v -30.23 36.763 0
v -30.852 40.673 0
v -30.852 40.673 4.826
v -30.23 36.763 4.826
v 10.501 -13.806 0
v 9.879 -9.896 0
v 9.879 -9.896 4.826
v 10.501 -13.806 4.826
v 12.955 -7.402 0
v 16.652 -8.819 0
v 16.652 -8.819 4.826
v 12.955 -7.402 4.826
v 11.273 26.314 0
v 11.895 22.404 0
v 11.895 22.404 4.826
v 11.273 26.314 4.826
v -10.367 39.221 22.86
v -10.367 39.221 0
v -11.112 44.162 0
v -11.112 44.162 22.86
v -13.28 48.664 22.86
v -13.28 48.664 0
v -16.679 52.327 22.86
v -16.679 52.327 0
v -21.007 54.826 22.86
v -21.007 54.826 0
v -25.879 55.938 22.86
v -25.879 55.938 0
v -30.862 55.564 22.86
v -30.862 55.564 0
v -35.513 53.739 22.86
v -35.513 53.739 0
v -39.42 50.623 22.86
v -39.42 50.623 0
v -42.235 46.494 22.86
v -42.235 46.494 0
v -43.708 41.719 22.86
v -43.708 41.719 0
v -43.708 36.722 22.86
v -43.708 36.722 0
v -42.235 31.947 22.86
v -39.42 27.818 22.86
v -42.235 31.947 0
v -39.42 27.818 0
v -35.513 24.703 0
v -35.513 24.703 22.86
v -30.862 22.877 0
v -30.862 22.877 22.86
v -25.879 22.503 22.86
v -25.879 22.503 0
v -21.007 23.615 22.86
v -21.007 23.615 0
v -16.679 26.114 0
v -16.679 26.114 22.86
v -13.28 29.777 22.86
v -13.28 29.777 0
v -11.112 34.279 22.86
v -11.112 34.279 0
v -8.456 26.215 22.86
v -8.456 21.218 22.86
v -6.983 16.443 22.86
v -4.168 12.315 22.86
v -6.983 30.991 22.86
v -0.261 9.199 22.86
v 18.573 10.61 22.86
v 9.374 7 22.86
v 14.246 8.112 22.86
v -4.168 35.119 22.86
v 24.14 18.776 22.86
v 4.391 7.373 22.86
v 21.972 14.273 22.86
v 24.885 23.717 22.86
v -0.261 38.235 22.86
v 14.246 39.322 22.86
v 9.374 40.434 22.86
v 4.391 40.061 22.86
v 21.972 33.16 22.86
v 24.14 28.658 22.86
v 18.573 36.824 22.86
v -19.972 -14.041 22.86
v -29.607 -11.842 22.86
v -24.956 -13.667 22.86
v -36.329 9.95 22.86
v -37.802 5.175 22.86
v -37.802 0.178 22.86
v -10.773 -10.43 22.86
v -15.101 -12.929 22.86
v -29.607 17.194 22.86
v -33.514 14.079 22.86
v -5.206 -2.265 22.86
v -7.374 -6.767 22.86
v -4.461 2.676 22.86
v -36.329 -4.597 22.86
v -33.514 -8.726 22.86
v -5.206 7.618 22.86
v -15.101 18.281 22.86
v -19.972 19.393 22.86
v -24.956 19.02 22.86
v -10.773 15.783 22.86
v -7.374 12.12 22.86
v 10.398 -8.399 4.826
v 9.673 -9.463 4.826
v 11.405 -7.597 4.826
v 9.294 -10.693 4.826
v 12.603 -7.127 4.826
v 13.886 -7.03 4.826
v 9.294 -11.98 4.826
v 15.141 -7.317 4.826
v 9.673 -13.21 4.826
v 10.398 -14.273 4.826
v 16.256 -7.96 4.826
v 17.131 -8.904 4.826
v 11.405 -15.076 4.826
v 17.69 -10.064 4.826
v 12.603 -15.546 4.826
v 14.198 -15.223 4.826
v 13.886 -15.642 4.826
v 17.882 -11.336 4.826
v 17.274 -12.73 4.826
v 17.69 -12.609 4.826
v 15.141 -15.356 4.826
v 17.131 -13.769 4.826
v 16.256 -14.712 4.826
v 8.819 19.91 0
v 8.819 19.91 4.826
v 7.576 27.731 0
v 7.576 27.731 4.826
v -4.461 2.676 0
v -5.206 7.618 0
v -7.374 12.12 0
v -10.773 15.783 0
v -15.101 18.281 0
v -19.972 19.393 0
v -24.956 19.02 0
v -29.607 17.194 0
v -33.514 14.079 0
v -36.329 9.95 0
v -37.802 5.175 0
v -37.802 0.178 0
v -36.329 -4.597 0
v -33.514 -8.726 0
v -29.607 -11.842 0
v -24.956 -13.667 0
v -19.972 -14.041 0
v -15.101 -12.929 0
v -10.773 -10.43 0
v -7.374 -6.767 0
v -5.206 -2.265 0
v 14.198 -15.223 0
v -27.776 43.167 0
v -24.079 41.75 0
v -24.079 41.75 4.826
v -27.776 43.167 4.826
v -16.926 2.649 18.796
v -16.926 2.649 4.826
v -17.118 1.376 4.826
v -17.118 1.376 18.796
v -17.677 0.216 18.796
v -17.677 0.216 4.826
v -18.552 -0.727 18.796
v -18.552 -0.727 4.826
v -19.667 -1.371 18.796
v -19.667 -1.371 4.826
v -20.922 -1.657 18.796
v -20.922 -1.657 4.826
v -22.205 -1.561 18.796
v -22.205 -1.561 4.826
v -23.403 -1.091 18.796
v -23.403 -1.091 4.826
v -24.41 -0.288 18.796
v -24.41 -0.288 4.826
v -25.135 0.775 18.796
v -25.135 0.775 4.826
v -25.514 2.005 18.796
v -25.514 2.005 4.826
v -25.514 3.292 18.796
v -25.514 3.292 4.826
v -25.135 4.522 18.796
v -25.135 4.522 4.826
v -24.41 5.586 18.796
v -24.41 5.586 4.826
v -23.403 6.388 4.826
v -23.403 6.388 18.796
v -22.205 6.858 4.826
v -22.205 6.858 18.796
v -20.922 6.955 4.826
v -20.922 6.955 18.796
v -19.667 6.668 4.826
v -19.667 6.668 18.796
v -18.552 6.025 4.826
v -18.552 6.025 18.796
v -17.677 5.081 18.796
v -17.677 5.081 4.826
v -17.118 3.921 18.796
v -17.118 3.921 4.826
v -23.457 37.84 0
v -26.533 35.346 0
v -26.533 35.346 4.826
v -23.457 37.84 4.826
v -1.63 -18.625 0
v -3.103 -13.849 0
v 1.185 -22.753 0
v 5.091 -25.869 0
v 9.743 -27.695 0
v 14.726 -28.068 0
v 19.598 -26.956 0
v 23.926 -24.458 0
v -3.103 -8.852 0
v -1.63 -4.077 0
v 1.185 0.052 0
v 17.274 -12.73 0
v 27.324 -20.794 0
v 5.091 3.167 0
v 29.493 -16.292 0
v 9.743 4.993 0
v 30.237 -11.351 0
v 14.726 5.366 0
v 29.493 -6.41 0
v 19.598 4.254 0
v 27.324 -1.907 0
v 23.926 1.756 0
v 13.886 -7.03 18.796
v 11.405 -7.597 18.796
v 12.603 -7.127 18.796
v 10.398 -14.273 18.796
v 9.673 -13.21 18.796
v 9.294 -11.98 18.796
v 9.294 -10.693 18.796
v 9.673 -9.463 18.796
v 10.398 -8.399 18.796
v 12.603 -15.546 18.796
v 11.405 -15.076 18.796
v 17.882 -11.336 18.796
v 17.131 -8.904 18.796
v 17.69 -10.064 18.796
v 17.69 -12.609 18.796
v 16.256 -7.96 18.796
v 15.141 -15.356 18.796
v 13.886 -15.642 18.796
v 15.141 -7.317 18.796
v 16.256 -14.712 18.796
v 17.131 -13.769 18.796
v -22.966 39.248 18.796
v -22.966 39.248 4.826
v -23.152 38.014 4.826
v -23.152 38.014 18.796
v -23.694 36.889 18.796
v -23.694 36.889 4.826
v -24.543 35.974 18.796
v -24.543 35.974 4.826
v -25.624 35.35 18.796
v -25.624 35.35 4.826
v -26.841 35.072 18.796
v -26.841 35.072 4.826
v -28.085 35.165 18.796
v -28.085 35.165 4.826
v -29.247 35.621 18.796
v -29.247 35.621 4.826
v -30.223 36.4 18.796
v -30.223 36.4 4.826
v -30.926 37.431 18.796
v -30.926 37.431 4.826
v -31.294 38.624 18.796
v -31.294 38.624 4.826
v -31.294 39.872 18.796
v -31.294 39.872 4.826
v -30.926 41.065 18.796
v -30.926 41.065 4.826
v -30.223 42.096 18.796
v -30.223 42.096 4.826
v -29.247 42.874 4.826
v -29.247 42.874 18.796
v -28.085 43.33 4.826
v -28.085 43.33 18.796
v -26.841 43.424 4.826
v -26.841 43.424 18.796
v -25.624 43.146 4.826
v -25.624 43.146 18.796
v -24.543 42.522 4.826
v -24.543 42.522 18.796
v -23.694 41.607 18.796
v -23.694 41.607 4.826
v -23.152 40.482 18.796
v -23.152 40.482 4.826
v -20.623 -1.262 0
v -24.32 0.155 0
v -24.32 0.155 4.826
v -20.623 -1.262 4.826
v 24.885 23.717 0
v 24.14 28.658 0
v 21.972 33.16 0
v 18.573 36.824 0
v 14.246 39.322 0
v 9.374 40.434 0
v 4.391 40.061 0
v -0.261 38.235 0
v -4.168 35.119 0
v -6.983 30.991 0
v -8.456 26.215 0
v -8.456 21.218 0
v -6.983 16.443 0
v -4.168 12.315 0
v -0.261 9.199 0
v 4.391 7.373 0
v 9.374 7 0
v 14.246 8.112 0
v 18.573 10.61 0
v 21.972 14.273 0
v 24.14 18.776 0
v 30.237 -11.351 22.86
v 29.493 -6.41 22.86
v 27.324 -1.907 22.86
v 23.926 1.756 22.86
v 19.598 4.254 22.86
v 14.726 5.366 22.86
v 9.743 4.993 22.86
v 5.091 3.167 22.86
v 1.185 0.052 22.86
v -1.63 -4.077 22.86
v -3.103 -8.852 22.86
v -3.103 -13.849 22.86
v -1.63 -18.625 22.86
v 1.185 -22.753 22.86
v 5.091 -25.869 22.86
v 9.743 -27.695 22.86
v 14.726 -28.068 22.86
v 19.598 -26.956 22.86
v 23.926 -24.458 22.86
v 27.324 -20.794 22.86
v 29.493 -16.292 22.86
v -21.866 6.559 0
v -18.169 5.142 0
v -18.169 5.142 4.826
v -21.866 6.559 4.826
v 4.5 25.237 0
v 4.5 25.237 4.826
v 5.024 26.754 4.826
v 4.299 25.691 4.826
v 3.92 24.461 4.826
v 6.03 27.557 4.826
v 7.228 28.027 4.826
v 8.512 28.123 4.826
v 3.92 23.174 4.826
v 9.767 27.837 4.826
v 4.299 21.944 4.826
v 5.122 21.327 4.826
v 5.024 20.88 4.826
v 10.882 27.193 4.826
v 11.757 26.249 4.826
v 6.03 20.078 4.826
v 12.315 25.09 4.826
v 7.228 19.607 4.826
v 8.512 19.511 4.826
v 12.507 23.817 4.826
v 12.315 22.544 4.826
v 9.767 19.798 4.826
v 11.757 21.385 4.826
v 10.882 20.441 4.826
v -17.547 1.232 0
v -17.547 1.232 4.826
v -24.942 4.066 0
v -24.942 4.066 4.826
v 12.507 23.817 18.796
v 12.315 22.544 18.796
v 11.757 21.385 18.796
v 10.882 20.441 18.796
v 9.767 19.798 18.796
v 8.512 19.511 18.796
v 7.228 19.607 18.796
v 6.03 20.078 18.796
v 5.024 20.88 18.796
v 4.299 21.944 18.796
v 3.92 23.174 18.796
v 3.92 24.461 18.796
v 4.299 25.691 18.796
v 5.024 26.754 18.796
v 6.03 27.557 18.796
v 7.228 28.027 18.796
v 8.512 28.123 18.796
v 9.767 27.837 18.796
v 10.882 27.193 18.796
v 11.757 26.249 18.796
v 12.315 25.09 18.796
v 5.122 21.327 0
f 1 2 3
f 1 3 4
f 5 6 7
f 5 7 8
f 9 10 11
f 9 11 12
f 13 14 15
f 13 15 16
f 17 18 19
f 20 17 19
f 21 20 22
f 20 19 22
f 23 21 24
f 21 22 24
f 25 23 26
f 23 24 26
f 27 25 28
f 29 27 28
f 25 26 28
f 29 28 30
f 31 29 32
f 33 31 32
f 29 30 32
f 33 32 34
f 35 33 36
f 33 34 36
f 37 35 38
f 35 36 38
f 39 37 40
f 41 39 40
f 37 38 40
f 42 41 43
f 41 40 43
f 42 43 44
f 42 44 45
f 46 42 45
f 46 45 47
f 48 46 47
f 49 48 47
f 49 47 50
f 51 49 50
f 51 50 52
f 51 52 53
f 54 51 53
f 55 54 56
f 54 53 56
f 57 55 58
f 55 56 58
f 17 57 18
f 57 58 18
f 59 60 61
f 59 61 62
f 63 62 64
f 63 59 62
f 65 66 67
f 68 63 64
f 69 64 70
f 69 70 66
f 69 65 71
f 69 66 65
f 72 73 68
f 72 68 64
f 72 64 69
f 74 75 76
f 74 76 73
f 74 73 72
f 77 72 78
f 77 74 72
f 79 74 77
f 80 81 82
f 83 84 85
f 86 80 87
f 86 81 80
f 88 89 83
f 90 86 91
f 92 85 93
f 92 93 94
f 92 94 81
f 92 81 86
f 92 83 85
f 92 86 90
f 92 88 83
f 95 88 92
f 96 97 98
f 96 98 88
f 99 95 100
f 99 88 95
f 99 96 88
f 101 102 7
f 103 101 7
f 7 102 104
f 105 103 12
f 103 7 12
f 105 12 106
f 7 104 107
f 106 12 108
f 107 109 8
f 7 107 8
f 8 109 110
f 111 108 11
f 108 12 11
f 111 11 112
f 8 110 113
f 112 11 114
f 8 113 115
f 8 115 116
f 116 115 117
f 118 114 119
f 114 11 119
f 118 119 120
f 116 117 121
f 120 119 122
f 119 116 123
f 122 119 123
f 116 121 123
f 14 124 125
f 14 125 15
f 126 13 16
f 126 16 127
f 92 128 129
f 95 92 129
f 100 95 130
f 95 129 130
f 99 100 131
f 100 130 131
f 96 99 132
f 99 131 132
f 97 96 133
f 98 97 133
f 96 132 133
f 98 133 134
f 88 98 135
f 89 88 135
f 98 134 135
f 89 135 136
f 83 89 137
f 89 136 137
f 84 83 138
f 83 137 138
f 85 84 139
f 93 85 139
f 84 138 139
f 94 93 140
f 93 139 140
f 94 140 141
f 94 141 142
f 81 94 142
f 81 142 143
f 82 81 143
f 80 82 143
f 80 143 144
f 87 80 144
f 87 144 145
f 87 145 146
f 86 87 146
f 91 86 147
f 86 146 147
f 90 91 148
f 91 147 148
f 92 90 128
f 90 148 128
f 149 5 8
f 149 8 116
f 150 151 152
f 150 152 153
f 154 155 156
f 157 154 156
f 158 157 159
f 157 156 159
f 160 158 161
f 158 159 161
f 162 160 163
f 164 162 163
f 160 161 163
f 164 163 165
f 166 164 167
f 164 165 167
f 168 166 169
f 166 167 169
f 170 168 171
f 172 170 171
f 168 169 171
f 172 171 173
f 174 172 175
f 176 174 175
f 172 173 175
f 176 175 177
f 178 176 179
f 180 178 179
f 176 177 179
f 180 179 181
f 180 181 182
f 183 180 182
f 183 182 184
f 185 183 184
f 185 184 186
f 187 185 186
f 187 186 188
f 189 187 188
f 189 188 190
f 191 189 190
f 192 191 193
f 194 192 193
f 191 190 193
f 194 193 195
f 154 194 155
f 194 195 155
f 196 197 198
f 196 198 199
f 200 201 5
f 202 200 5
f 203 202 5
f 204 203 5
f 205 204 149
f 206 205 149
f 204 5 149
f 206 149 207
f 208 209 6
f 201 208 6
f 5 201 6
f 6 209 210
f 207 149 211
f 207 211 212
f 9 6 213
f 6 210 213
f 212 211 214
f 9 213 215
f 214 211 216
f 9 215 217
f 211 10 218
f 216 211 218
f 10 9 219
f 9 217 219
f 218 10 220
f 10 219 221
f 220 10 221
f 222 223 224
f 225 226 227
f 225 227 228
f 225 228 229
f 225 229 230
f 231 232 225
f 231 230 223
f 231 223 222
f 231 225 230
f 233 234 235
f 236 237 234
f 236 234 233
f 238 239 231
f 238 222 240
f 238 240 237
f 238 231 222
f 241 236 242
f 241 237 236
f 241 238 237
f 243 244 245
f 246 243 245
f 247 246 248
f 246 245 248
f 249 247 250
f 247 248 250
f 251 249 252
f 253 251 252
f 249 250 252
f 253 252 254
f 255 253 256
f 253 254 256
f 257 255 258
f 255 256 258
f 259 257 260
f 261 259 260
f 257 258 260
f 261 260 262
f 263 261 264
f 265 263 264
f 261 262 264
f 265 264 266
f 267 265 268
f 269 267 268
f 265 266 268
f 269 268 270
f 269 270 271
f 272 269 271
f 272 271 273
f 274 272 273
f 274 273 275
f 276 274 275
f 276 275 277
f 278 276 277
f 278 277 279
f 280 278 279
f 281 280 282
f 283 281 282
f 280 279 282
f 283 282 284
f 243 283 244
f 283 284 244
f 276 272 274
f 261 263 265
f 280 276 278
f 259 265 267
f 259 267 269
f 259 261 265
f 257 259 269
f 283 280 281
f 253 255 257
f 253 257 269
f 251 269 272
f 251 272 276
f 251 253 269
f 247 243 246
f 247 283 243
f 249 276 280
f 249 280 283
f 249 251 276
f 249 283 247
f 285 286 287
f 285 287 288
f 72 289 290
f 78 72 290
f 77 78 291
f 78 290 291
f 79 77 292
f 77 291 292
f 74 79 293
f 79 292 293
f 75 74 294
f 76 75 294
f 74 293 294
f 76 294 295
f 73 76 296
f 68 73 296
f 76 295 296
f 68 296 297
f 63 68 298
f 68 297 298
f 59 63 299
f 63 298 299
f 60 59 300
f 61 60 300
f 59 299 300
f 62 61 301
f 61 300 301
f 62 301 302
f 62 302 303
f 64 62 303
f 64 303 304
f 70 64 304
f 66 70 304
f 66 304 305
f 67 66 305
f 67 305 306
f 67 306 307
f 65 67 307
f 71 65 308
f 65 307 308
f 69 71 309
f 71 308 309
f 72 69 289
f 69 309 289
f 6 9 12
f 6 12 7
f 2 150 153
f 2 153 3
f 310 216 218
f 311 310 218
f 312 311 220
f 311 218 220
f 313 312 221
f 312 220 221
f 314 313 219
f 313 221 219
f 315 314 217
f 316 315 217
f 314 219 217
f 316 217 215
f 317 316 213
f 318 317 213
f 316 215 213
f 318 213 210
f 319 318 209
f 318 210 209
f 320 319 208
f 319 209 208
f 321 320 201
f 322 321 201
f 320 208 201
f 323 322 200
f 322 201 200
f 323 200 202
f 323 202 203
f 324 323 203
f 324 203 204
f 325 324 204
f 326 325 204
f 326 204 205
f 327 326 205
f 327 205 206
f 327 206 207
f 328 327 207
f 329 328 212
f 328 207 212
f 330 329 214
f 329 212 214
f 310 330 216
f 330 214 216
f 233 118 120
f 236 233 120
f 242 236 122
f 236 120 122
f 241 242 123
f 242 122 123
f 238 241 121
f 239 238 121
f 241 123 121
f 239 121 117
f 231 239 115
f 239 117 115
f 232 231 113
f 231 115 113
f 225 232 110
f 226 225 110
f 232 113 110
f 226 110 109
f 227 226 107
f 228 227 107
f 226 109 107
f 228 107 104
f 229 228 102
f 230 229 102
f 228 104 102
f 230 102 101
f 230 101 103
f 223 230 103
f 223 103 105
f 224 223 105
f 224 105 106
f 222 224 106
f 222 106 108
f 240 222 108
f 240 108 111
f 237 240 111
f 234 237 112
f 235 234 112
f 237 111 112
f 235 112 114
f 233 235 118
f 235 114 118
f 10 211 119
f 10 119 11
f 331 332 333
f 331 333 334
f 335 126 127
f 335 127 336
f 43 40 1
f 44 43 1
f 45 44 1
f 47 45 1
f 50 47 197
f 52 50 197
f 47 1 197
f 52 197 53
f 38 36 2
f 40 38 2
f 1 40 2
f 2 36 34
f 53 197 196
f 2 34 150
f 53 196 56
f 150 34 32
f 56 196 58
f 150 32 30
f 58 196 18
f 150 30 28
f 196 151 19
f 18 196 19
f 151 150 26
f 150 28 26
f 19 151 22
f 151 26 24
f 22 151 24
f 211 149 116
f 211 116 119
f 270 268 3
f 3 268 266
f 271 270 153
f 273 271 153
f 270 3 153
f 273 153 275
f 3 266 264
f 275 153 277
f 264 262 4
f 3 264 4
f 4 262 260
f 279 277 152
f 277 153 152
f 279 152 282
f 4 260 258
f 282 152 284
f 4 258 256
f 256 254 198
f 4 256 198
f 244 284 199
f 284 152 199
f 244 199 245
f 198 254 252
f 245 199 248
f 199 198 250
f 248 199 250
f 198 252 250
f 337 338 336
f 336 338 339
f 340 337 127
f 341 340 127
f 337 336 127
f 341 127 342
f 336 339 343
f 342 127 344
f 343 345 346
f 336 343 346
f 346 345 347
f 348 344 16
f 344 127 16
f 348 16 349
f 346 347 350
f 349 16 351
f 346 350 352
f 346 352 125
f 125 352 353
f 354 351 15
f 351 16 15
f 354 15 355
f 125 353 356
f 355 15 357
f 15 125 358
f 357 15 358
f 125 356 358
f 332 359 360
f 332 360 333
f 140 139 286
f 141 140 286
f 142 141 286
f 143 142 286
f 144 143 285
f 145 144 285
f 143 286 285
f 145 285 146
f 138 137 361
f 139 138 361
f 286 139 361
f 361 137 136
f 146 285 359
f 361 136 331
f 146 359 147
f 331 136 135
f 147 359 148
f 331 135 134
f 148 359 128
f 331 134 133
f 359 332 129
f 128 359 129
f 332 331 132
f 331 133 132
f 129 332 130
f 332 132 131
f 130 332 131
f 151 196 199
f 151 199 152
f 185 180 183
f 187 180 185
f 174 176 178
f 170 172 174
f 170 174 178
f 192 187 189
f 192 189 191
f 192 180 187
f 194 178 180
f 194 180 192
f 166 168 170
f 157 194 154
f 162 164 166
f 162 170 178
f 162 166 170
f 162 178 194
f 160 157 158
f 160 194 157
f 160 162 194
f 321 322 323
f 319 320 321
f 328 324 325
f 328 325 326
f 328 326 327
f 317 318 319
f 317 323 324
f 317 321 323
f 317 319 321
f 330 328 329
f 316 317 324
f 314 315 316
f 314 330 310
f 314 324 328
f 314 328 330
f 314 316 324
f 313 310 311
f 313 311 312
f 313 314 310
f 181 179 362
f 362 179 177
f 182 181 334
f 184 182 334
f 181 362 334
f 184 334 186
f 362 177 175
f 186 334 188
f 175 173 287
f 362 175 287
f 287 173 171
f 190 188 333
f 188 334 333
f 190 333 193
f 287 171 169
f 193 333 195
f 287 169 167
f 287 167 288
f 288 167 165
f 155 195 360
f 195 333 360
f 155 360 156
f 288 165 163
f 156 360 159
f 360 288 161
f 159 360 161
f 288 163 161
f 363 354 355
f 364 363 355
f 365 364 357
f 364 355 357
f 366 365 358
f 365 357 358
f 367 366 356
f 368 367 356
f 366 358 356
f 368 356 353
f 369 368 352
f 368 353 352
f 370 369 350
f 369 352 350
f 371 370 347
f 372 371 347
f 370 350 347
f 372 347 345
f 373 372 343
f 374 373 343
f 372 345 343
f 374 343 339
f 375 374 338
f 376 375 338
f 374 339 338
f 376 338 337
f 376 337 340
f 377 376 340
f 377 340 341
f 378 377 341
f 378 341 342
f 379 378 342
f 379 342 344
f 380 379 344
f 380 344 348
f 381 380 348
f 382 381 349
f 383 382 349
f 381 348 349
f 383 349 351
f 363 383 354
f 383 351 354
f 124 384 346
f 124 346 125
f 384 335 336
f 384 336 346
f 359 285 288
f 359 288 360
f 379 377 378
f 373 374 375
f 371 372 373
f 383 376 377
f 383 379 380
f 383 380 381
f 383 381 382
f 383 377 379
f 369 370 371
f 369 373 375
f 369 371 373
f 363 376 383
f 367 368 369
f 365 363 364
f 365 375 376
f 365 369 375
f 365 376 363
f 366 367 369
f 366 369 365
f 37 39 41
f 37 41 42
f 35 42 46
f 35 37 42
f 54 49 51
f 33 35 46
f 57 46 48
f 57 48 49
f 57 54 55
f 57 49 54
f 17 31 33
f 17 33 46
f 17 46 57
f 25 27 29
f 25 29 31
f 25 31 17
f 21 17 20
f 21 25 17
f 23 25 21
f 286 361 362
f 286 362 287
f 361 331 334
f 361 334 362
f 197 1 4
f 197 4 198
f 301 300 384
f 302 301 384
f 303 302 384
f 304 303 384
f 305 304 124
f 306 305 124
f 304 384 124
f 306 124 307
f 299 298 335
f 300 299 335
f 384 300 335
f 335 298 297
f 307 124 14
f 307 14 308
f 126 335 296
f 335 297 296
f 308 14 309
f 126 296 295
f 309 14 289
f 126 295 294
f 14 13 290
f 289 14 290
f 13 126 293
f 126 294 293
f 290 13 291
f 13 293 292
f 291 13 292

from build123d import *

# Parameters (mm, degrees)
F0_R     = 16.764
F1_DEPTH = 22.86
F3_DEPTH = 4.826
F4_R     = 4.318
F4_R_2   = 4.187513
F5_DEPTH = 13.97


with BuildPart() as f1:
    # F0 (on Top) → F1 (new body)
    with BuildSketch(Plane.XY):
        with Locations((-27.13142, 39.22059)):
            Circle(F0_R)
        with Locations((8.120969, 23.716921)):
            Circle(F0_R)
        with Locations((-21.225259, 2.676229)):
            Circle(F0_R)
        with Locations((13.473423, -11.350901)):
            Circle(F0_R)
    extrude(amount=F1_DEPTH)

    # F2 (on Top) → F3 (cut)
    with BuildSketch(Plane.XY):
        Polygon((-23.457318, 37.839593), (-24.078989, 41.749953), (-27.776295, 43.16675), (-30.851931, 40.673187), (-30.23026, 36.762827), (-26.532953, 35.34603), align=None)
        Polygon((11.89495, 22.403905), (11.273279, 26.314265), (7.575973, 27.731062), (4.500337, 25.237499), (5.122008, 21.327139), (8.819315, 19.910342), align=None)
        Polygon((-17.54694, 1.231937), (-18.168611, 5.142297), (-21.865918, 6.559094), (-24.941553, 4.065531), (-24.319882, 0.155171), (-20.622575, -1.261626), align=None)
        Polygon((17.2741, -12.729515), (16.652429, -8.819156), (12.955122, -7.402359), (9.879487, -9.895922), (10.501158, -13.806281), (14.198465, -15.223078), align=None)
    extrude(amount=F3_DEPTH, mode=Mode.SUBTRACT)

    # F4 (on face) → F5 (cut)
    with BuildSketch(Plane(origin=(0, 0, 4.826), x_dir=(1, 0, 0), z_dir=(0, 0, -1))):
        with Locations((-21.244247, -2.648734)):
            Circle(F4_R)
        with Locations((13.56379, 11.33628)):
            Circle(F4_R)
        with Locations((8.189308, -23.817073)):
            Circle(F4_R)
        with Locations((-27.153491, -39.247921)):
            Circle(F4_R_2)
    extrude(amount=-F5_DEPTH, mode=Mode.SUBTRACT)


solid = f1.part
